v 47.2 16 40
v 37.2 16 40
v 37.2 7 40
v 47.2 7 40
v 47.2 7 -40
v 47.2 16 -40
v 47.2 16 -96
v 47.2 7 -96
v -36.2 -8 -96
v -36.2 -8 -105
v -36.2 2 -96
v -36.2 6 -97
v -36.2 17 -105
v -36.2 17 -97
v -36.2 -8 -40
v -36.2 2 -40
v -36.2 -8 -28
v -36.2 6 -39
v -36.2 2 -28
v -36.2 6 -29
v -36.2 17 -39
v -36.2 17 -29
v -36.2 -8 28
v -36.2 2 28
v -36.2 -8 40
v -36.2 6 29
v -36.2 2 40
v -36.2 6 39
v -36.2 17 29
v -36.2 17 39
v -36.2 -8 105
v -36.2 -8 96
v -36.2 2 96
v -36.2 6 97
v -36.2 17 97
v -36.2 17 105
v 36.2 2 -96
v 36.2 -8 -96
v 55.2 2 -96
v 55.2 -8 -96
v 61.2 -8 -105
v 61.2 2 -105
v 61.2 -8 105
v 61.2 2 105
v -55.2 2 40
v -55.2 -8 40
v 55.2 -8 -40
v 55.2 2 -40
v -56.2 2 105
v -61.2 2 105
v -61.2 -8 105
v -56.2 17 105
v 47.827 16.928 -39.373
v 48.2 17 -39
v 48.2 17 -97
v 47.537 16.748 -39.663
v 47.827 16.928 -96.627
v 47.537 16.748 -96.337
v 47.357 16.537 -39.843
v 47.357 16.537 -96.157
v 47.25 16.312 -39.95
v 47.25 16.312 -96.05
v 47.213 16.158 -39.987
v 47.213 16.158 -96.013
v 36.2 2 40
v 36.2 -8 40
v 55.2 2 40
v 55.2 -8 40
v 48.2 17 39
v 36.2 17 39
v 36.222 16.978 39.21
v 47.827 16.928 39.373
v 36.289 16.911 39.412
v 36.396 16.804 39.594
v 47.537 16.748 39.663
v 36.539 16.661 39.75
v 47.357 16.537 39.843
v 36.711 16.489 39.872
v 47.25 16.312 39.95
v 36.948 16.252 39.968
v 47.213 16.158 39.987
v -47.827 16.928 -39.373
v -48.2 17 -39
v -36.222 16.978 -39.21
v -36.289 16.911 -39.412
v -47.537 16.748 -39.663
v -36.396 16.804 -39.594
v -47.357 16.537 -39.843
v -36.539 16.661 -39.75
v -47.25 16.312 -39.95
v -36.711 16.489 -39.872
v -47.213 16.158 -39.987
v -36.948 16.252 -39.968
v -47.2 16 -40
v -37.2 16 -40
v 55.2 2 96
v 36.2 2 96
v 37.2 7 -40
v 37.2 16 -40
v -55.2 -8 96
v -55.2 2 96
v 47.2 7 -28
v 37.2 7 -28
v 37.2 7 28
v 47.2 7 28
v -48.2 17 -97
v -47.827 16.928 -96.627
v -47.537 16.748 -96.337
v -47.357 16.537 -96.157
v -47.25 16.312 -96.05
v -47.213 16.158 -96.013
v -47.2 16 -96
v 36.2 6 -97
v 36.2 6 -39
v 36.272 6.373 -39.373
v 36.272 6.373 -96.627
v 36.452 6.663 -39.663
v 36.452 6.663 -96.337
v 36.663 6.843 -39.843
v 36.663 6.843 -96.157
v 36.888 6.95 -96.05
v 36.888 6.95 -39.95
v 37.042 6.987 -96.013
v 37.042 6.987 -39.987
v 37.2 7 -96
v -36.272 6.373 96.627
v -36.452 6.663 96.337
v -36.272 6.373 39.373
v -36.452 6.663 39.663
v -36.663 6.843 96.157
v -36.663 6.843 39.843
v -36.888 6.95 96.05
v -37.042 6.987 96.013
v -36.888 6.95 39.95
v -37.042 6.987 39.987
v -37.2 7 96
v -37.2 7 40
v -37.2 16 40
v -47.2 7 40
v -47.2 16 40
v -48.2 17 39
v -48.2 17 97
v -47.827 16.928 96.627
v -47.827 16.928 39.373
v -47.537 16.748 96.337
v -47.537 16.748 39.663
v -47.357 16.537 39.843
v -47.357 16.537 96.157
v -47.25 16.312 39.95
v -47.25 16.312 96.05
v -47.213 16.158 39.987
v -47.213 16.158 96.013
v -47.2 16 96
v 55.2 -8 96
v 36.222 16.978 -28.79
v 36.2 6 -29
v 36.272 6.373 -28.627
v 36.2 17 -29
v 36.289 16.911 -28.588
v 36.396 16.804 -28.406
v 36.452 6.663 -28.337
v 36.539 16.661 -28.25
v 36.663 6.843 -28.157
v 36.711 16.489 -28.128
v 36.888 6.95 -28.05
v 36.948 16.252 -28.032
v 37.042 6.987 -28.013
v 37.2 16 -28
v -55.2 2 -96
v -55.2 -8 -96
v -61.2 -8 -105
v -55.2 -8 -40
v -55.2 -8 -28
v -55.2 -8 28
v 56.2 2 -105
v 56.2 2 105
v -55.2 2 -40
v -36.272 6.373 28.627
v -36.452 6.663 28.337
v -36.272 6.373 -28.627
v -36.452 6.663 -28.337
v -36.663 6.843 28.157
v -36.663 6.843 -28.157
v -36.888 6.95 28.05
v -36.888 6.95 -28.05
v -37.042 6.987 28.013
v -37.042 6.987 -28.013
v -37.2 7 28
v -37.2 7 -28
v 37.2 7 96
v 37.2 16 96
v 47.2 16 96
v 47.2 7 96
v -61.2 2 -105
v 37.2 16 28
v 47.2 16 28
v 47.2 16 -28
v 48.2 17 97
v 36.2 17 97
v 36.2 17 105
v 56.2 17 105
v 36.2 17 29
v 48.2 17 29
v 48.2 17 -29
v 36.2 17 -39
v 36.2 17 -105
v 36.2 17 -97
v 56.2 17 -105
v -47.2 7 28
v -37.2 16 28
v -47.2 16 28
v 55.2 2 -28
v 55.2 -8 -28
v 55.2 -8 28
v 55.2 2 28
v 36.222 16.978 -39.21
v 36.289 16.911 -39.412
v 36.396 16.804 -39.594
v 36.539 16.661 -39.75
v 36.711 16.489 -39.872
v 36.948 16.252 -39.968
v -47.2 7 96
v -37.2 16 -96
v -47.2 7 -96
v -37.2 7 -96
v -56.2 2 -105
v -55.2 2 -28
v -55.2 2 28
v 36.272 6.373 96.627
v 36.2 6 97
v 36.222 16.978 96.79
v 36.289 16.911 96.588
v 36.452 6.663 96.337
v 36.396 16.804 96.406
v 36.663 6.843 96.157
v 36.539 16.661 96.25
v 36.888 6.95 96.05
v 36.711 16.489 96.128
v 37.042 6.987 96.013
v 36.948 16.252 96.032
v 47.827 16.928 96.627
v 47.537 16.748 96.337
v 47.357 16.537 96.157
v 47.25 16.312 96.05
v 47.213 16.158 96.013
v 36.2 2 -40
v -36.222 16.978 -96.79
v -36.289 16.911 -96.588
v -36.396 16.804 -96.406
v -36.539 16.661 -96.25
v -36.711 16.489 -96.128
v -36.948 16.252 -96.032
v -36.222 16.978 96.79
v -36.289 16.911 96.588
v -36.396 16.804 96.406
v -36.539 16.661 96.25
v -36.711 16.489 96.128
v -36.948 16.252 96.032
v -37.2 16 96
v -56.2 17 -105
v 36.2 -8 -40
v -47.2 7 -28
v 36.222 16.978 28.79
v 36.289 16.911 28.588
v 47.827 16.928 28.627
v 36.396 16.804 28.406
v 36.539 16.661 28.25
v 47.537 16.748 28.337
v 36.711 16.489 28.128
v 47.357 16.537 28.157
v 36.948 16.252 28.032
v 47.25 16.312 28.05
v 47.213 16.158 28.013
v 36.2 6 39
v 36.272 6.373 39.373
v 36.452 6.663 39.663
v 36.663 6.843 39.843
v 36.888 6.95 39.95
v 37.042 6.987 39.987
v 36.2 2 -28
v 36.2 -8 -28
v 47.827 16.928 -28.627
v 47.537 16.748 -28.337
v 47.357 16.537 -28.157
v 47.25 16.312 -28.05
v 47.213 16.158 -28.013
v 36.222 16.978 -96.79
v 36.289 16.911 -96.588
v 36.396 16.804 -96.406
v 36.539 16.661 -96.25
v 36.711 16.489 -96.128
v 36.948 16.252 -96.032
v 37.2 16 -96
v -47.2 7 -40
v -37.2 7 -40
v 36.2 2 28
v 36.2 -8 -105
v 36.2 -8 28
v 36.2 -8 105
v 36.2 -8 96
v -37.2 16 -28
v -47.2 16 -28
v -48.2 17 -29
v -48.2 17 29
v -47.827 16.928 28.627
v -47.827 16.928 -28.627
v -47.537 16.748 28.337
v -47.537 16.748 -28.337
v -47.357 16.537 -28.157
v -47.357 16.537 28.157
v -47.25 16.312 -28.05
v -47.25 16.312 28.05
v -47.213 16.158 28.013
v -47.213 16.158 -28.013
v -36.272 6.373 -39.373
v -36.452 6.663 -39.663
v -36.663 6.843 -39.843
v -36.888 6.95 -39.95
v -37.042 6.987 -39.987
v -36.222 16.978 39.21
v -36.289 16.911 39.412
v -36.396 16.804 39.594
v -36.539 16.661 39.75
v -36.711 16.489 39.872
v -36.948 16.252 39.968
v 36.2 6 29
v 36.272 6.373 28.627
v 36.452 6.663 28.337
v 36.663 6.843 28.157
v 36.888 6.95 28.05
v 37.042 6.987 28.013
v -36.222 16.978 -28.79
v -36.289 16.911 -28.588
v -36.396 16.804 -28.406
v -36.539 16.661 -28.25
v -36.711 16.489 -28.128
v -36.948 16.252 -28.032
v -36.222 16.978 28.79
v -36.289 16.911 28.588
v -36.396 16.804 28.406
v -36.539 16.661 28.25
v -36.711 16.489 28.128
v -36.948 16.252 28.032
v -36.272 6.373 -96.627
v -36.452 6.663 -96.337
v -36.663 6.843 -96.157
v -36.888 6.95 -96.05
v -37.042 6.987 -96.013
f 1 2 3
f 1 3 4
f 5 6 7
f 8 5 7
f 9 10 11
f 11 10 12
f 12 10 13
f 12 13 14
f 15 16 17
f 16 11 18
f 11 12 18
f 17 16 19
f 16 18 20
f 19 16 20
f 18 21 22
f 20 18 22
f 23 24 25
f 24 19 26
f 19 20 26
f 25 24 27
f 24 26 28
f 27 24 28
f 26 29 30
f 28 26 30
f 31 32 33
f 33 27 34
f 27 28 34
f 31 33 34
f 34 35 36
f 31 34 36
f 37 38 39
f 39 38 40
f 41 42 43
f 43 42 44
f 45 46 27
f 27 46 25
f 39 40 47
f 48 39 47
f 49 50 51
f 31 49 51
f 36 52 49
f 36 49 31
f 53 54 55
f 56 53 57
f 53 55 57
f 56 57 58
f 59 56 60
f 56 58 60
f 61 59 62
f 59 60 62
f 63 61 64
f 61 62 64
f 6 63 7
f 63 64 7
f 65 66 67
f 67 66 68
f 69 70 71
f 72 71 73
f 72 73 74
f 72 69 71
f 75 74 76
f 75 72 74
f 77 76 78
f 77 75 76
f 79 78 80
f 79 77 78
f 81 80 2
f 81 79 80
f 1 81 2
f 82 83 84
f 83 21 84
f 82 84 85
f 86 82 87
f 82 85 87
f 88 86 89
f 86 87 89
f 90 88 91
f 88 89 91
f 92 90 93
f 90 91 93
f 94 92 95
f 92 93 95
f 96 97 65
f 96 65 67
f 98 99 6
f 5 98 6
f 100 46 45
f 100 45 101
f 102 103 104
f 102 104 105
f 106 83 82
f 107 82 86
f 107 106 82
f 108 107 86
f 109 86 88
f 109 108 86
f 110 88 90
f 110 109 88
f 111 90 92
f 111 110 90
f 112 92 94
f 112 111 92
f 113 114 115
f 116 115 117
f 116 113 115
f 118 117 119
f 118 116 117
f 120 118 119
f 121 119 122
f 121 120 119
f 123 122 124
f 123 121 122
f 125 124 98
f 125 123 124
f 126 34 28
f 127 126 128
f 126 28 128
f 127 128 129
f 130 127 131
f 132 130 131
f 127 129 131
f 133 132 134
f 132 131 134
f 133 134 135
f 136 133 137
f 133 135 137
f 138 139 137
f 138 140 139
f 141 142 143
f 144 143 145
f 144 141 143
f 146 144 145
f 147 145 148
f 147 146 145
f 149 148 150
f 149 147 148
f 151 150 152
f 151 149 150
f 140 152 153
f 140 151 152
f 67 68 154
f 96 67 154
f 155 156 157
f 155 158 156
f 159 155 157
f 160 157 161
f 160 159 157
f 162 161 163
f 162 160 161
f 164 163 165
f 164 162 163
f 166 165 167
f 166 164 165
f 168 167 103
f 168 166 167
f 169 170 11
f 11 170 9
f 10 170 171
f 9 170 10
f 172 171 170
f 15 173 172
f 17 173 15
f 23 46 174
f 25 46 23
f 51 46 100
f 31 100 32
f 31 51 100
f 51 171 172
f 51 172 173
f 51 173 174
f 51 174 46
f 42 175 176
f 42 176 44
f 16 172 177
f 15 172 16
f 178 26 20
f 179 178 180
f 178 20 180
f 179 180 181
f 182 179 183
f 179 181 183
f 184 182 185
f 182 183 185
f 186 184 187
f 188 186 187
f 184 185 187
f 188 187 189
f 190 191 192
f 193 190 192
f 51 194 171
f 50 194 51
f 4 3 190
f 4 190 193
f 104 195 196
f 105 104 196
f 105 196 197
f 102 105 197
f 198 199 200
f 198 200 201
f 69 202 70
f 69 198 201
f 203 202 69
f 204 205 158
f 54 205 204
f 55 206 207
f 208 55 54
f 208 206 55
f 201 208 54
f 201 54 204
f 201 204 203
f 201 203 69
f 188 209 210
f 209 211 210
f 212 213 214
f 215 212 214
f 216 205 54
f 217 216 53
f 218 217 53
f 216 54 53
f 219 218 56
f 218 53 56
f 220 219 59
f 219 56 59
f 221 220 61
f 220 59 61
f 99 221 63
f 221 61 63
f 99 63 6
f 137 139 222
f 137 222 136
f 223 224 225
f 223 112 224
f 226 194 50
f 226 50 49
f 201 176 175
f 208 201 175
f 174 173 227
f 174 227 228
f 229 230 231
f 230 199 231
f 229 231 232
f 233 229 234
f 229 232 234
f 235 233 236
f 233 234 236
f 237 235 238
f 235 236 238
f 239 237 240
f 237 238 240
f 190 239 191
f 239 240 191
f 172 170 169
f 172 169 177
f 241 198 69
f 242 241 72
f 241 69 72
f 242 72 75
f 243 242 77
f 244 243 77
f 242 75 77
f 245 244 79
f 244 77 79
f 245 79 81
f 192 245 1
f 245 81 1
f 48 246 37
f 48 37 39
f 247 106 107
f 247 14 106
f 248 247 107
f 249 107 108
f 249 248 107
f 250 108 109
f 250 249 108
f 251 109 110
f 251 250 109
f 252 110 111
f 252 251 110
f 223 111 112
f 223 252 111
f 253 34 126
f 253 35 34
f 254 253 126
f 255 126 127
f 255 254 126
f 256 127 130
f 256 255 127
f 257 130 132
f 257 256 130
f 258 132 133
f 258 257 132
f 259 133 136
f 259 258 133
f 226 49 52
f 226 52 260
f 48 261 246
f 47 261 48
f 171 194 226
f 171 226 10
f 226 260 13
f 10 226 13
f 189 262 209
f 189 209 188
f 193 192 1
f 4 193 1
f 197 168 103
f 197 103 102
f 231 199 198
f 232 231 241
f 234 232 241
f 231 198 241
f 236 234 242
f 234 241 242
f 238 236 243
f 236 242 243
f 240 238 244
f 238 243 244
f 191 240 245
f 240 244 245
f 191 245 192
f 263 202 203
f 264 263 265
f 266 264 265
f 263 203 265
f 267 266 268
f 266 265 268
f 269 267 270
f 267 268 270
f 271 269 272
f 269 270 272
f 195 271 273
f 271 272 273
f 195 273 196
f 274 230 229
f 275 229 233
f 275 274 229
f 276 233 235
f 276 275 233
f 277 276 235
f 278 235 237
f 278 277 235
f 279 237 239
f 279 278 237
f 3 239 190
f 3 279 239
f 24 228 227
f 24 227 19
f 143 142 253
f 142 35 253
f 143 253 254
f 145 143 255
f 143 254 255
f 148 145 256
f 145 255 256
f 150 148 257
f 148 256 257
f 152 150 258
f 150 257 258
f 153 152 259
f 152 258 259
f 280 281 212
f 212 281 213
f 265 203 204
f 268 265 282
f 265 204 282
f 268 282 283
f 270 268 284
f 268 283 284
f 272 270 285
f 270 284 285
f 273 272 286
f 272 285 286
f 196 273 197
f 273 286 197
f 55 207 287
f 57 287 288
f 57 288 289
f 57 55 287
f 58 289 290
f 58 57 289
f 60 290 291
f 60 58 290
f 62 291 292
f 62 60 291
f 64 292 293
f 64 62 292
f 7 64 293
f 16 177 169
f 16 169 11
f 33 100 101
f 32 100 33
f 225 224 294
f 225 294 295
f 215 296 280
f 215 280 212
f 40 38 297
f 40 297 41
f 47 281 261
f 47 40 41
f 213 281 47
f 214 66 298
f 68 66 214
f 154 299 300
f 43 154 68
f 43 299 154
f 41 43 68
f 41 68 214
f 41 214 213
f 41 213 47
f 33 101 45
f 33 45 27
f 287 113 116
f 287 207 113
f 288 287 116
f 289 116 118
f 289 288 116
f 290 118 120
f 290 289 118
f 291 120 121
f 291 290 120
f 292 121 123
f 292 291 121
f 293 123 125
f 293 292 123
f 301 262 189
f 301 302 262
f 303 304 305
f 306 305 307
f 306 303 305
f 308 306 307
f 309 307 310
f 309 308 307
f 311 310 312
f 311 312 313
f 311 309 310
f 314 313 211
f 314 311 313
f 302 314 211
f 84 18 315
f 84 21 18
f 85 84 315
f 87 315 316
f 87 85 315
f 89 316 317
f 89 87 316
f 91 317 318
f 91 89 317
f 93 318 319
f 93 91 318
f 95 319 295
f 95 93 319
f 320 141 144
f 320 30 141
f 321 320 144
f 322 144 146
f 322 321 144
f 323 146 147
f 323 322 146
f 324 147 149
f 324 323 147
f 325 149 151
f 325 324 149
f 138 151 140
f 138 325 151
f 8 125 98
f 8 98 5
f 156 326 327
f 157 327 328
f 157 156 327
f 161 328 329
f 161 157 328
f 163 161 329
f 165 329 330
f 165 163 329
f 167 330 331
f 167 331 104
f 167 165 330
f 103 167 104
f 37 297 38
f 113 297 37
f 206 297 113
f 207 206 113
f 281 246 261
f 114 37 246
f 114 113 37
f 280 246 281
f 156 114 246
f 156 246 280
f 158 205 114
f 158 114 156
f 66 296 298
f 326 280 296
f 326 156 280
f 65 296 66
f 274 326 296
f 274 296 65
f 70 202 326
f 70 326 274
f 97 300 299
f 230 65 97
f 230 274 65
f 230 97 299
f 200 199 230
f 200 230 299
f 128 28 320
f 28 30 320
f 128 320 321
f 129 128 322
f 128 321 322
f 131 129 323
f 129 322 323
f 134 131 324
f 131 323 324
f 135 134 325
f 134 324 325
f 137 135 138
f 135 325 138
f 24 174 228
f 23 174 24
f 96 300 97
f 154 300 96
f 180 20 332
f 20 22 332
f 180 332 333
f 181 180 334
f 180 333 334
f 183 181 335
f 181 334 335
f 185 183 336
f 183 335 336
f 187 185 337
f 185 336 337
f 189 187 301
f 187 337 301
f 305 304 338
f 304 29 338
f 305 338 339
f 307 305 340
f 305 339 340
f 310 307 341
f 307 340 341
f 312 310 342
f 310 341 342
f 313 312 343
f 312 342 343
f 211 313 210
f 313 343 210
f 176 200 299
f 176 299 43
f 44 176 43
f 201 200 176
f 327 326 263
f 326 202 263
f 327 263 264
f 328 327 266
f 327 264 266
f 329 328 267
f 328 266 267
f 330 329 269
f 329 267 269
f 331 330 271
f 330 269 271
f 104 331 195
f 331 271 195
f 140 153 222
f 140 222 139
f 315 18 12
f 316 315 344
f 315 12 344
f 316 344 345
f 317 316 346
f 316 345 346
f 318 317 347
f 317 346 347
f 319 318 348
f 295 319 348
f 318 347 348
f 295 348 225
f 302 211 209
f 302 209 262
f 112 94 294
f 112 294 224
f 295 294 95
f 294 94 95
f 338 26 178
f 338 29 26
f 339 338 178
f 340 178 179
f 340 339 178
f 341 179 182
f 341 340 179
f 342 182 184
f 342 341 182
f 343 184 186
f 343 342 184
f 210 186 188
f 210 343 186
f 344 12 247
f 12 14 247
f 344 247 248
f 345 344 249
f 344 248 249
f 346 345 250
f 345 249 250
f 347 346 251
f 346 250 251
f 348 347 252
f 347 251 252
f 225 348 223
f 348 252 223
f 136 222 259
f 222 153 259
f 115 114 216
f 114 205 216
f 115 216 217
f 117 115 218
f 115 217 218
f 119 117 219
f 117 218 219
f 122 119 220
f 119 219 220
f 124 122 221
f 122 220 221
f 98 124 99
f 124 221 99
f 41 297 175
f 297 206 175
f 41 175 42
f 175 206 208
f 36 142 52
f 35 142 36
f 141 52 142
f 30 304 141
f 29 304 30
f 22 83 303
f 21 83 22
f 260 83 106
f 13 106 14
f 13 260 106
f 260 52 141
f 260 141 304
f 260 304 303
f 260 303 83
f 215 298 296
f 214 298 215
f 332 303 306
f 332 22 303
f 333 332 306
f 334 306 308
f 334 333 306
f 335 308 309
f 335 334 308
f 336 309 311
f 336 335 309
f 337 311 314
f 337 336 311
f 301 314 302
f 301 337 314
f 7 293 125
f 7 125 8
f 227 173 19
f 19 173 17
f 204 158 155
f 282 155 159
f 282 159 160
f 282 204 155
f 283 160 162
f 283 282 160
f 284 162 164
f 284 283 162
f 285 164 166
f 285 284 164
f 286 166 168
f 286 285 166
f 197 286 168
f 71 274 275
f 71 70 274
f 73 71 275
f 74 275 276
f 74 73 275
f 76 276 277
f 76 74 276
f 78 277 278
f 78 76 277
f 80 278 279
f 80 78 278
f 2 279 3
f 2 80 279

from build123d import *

# Parameters (mm, degrees)
SKIZZE1_W                       = 140
SKIZZE1_H                       = 210
AUFSATZ_LINEAR_AUSTRAGEN1_DEPTH = 2
SKIZZE2_W                       = 20
SKIZZE2_H                       = 210
AUFSATZ_LINEAR_AUSTRAGEN2_DEPTH = 15
SKIZZE3_W                       = 94.4
SKIZZE3_H                       = 56
SCHNITT_LINEAR_AUSTRAGEN1_DEPTH = 10
VERRUNDUNG1_R                   = 1
SKIZZE4_W                       = 140
SKIZZE4_H                       = 210
SCHNITT_LINEAR_AUSTRAGEN2_DEPTH = 2
SKIZZE7_W                       = 25
SKIZZE7_H                       = 210
AUFSATZ_LINEAR_AUSTRAGEN3_DEPTH = 10
SKIZZE5_W                       = 110.4
SKIZZE5_H                       = 56
SCHNITT_LINEAR_AUSTRAGEN3_DEPTH = 10


with BuildPart() as part:
    # Skizze1 → Aufsatz-Linear austragen1 (new body)
    with BuildSketch(Plane(origin=(0, 0, 0), x_dir=(1, 0, 0), z_dir=(0, 1, 0))):
        Rectangle(SKIZZE1_W, SKIZZE1_H)
    extrude(amount=AUFSATZ_LINEAR_AUSTRAGEN1_DEPTH)

    # Skizze2 → Aufsatz-Linear austragen2 (add)
    with BuildSketch(Plane(origin=(0, 2, 0), x_dir=(1, 0, 0), z_dir=(0, 1, 0))):
        with Locations((-46.2, 0)):
            Rectangle(SKIZZE2_W, SKIZZE2_H)
        with Locations((46.2, 0)):
            Rectangle(SKIZZE2_W, SKIZZE2_H)
    extrude(amount=AUFSATZ_LINEAR_AUSTRAGEN2_DEPTH)

    # Skizze3 → Schnitt-Linear austragen1 (cut)
    with BuildSketch(Plane(origin=(0, 17, 0), x_dir=(1, 0, 0), z_dir=(0, 1, 0))):
        Rectangle(SKIZZE3_W, SKIZZE3_H)
        with Locations((0, -68)):
            Rectangle(SKIZZE3_W, SKIZZE3_H)
        with Locations((0, 68)):
            Rectangle(SKIZZE3_W, SKIZZE3_H)
    extrude(amount=-SCHNITT_LINEAR_AUSTRAGEN1_DEPTH, mode=Mode.SUBTRACT)

    # Verrundung1
    verrundung1_edges = [part.edges().sort_by_distance(p)[0] for p in [
        (41.7, 17, 28),
        (41.7, 17, -40),
        (41.7, 17, 96),
        (36.2, 7, 0),
        (36.2, 7, -68),
        (36.2, 7, 68),
        (-36.2, 7, 68),
        (-41.7, 17, 40),
        (-47.2, 17, 68),
        (-41.7, 17, 96),
        (47.2, 17, 68),
        (41.7, 17, 40),
        (-36.2, 12, 96),
        (36.2, 12, 96),
        (-36.2, 12, 40),
        (36.2, 12, 40),
        (-36.2, 7, -68),
        (-41.7, 17, -96),
        (-47.2, 17, -68),
        (-41.7, 17, -40),
        (47.2, 17, -68),
        (41.7, 17, -96),
        (-36.2, 12, -40),
        (36.2, 12, -40),
        (-36.2, 12, -96),
        (36.2, 12, -96),
        (-36.2, 7, 0),
        (-41.7, 17, -28),
        (-47.2, 17, 0),
        (-41.7, 17, 28),
        (47.2, 17, 0),
        (41.7, 17, -28),
        (-36.2, 12, 28),
        (36.2, 12, 28),
        (-36.2, 12, -28),
        (36.2, 12, -28),
    ]]
    fillet(verrundung1_edges, radius=VERRUNDUNG1_R)

    # Skizze4 → Schnitt-Linear austragen2 (cut)
    with BuildSketch(Plane.XZ):
        Rectangle(SKIZZE4_W, SKIZZE4_H)
    extrude(amount=-SCHNITT_LINEAR_AUSTRAGEN2_DEPTH, mode=Mode.SUBTRACT)

    # Skizze7 → Aufsatz-Linear austragen3 (add)
    with BuildSketch(Plane.XZ.offset(-2)):
        with Locations((-48.7, 0)):
            Rectangle(SKIZZE7_W, SKIZZE7_H)
        with Locations((48.7, 0)):
            Rectangle(SKIZZE7_W, SKIZZE7_H)
    extrude(amount=AUFSATZ_LINEAR_AUSTRAGEN3_DEPTH)

    # Skizze5 → Schnitt-Linear austragen3 (cut)
    with BuildSketch(Plane.XZ.offset(8)):
        Rectangle(SKIZZE5_W, SKIZZE5_H)
        with Locations((0, -68)):
            Rectangle(SKIZZE5_W, SKIZZE5_H)
        with Locations((0, 68)):
            Rectangle(SKIZZE5_W, SKIZZE5_H)
    extrude(amount=-SCHNITT_LINEAR_AUSTRAGEN3_DEPTH, mode=Mode.SUBTRACT)


solid = part.part
